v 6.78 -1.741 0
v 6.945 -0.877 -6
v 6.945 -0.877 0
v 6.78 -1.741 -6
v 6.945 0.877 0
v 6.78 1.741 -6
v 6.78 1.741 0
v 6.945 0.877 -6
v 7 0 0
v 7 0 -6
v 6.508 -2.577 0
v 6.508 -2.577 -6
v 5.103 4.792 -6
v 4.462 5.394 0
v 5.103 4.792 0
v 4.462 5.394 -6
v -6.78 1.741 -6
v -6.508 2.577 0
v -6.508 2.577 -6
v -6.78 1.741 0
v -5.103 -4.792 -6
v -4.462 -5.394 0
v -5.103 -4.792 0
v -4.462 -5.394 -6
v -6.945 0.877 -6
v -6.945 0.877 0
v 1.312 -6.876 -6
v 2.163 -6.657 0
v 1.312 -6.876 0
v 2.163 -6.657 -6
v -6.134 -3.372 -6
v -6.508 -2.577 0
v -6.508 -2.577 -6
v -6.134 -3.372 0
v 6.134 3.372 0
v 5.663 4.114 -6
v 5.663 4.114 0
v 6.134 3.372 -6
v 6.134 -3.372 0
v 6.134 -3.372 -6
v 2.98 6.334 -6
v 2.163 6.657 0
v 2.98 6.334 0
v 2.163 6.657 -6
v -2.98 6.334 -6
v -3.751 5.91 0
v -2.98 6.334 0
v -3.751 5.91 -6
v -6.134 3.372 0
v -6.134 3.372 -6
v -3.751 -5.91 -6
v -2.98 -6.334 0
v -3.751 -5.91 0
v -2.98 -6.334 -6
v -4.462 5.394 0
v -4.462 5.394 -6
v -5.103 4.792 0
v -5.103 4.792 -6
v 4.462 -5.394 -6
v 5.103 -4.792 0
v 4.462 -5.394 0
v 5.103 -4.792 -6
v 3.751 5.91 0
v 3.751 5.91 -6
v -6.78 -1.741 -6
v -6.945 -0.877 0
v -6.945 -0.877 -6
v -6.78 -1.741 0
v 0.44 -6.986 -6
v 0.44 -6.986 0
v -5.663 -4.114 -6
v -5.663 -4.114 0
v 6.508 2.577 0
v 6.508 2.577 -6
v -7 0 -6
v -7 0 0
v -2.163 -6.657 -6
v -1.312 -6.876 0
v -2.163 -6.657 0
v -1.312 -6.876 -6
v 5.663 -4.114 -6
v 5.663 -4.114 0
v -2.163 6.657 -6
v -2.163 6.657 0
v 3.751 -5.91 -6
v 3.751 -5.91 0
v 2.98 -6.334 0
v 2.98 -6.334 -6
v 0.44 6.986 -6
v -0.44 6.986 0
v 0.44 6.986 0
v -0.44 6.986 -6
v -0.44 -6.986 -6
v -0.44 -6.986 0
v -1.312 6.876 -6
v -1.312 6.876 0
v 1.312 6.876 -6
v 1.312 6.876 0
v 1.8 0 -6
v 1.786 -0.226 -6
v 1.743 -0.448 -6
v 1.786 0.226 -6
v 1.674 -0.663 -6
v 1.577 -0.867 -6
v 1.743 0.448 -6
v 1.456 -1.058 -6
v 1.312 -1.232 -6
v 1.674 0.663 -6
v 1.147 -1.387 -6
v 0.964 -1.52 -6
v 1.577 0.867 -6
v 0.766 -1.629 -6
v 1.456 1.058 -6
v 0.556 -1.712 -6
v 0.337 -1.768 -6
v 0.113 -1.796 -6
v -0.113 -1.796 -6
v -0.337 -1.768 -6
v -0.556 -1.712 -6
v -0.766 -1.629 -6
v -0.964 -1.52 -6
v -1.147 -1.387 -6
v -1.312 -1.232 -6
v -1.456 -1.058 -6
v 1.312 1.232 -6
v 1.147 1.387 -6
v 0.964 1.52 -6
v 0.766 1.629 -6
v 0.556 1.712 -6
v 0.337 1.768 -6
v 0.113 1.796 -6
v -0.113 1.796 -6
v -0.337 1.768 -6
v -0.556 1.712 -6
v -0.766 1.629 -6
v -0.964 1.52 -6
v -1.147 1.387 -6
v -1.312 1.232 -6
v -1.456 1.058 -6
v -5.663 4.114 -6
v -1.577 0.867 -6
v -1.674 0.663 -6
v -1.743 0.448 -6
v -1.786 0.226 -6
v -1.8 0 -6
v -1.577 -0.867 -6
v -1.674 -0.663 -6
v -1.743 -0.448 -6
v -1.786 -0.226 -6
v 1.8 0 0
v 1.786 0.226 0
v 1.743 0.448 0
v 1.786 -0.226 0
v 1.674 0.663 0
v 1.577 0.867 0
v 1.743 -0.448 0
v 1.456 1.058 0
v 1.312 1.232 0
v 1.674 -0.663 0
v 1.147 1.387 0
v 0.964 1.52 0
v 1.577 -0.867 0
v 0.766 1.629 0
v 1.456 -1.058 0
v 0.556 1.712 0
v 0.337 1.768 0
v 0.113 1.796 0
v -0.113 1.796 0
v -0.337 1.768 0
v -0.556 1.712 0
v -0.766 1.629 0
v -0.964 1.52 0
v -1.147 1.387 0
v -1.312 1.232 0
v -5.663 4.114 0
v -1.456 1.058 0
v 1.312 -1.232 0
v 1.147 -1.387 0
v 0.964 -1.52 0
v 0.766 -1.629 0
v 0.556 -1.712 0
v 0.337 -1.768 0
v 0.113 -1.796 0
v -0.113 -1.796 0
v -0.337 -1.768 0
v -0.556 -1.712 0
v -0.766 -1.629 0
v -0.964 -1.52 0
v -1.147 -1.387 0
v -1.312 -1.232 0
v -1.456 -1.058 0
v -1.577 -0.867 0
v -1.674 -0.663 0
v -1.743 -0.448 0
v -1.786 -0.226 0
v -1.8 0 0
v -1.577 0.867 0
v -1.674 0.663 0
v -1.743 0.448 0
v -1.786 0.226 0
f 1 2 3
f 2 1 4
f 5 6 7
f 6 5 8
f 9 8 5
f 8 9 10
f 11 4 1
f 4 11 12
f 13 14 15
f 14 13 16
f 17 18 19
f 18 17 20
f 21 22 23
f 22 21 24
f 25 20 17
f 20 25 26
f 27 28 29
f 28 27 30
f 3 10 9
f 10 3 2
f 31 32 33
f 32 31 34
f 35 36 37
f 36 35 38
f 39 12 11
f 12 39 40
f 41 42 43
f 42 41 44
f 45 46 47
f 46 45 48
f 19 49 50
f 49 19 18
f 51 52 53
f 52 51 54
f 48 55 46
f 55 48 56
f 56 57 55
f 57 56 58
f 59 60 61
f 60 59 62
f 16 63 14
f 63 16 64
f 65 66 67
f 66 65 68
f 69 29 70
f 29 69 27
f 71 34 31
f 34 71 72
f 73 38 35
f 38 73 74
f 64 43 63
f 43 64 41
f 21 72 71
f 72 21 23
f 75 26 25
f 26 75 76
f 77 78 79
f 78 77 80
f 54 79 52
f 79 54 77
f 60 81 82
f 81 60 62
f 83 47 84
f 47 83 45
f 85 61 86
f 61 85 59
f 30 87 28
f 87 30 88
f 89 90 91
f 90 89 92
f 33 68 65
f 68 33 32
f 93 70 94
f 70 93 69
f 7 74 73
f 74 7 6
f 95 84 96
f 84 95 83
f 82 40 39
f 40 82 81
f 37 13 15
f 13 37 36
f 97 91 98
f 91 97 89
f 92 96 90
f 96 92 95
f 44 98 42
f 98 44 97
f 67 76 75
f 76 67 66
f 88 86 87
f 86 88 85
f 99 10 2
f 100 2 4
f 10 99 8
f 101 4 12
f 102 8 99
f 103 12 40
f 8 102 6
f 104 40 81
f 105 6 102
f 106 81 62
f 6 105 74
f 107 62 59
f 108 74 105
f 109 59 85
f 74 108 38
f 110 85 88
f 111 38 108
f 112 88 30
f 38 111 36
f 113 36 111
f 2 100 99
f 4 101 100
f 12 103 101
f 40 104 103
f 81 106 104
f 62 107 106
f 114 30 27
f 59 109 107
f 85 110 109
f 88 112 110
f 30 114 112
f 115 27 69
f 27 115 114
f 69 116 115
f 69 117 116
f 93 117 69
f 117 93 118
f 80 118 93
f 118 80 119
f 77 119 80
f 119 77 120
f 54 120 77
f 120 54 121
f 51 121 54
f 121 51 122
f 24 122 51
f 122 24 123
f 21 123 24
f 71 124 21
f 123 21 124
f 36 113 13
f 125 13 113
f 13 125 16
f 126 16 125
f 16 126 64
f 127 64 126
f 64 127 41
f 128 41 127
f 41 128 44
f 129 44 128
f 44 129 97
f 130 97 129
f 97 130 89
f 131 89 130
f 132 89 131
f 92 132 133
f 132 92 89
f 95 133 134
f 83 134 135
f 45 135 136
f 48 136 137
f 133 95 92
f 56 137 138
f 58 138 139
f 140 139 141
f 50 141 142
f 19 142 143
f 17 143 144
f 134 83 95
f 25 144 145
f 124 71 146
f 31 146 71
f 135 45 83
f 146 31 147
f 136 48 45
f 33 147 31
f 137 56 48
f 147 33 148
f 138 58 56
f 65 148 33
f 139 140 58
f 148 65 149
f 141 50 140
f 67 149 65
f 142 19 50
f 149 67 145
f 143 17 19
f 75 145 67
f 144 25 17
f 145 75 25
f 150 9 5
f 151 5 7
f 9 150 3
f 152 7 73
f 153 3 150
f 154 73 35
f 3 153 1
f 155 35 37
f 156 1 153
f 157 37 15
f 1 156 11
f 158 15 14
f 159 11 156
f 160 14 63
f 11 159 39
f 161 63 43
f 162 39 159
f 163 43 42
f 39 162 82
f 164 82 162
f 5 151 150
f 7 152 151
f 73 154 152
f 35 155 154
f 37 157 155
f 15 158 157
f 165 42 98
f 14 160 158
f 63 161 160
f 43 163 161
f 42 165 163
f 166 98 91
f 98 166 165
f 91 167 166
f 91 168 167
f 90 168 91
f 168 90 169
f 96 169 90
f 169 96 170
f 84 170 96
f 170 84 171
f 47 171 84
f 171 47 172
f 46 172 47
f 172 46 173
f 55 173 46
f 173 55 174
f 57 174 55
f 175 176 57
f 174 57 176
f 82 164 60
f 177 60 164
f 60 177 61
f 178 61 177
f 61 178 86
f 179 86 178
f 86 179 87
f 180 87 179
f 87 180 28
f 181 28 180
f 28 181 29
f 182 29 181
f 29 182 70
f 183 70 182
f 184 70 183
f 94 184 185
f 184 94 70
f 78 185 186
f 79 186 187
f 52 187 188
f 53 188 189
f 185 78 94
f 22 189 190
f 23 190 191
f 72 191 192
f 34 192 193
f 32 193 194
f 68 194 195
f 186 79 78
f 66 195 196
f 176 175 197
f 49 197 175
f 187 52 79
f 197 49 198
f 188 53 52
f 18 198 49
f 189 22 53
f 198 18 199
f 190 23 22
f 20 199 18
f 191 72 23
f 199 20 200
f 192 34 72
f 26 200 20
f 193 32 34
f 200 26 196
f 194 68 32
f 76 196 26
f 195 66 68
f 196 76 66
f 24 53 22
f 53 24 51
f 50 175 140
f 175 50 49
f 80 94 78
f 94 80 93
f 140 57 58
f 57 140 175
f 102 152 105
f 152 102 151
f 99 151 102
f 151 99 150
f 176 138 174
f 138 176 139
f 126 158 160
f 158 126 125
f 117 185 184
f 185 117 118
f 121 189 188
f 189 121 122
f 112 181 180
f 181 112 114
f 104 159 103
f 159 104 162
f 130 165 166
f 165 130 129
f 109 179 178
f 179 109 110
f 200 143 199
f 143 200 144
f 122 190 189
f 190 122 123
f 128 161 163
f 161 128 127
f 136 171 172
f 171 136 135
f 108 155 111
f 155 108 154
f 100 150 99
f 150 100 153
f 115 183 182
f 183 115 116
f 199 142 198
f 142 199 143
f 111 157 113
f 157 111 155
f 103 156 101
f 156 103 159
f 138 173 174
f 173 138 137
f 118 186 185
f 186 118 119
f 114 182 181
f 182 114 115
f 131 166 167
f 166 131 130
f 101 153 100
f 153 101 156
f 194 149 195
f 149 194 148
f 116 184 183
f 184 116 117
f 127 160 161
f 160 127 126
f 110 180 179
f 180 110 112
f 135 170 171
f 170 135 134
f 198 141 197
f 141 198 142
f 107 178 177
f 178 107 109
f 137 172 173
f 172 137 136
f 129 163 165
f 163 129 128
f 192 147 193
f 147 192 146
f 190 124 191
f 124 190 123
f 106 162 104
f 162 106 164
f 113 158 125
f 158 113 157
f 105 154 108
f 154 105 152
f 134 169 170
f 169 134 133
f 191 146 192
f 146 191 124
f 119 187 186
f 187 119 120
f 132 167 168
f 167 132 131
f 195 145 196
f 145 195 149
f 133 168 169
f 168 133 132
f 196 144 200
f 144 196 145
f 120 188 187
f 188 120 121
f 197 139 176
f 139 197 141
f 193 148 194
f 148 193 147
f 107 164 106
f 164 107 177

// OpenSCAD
$fn = 50;


difference() {
	union() {
		translate(v = [0, 0, -6.0000000000]) {
			cylinder(h = 6, r = 7.0000000000);
		}
		cylinder(h = 0, r = 10.0000000000);
	}
	union() {
		#translate(v = [0, 0, -6]) {
			cylinder(h = 6, r = 1.8000000000);
		}
	}
}
